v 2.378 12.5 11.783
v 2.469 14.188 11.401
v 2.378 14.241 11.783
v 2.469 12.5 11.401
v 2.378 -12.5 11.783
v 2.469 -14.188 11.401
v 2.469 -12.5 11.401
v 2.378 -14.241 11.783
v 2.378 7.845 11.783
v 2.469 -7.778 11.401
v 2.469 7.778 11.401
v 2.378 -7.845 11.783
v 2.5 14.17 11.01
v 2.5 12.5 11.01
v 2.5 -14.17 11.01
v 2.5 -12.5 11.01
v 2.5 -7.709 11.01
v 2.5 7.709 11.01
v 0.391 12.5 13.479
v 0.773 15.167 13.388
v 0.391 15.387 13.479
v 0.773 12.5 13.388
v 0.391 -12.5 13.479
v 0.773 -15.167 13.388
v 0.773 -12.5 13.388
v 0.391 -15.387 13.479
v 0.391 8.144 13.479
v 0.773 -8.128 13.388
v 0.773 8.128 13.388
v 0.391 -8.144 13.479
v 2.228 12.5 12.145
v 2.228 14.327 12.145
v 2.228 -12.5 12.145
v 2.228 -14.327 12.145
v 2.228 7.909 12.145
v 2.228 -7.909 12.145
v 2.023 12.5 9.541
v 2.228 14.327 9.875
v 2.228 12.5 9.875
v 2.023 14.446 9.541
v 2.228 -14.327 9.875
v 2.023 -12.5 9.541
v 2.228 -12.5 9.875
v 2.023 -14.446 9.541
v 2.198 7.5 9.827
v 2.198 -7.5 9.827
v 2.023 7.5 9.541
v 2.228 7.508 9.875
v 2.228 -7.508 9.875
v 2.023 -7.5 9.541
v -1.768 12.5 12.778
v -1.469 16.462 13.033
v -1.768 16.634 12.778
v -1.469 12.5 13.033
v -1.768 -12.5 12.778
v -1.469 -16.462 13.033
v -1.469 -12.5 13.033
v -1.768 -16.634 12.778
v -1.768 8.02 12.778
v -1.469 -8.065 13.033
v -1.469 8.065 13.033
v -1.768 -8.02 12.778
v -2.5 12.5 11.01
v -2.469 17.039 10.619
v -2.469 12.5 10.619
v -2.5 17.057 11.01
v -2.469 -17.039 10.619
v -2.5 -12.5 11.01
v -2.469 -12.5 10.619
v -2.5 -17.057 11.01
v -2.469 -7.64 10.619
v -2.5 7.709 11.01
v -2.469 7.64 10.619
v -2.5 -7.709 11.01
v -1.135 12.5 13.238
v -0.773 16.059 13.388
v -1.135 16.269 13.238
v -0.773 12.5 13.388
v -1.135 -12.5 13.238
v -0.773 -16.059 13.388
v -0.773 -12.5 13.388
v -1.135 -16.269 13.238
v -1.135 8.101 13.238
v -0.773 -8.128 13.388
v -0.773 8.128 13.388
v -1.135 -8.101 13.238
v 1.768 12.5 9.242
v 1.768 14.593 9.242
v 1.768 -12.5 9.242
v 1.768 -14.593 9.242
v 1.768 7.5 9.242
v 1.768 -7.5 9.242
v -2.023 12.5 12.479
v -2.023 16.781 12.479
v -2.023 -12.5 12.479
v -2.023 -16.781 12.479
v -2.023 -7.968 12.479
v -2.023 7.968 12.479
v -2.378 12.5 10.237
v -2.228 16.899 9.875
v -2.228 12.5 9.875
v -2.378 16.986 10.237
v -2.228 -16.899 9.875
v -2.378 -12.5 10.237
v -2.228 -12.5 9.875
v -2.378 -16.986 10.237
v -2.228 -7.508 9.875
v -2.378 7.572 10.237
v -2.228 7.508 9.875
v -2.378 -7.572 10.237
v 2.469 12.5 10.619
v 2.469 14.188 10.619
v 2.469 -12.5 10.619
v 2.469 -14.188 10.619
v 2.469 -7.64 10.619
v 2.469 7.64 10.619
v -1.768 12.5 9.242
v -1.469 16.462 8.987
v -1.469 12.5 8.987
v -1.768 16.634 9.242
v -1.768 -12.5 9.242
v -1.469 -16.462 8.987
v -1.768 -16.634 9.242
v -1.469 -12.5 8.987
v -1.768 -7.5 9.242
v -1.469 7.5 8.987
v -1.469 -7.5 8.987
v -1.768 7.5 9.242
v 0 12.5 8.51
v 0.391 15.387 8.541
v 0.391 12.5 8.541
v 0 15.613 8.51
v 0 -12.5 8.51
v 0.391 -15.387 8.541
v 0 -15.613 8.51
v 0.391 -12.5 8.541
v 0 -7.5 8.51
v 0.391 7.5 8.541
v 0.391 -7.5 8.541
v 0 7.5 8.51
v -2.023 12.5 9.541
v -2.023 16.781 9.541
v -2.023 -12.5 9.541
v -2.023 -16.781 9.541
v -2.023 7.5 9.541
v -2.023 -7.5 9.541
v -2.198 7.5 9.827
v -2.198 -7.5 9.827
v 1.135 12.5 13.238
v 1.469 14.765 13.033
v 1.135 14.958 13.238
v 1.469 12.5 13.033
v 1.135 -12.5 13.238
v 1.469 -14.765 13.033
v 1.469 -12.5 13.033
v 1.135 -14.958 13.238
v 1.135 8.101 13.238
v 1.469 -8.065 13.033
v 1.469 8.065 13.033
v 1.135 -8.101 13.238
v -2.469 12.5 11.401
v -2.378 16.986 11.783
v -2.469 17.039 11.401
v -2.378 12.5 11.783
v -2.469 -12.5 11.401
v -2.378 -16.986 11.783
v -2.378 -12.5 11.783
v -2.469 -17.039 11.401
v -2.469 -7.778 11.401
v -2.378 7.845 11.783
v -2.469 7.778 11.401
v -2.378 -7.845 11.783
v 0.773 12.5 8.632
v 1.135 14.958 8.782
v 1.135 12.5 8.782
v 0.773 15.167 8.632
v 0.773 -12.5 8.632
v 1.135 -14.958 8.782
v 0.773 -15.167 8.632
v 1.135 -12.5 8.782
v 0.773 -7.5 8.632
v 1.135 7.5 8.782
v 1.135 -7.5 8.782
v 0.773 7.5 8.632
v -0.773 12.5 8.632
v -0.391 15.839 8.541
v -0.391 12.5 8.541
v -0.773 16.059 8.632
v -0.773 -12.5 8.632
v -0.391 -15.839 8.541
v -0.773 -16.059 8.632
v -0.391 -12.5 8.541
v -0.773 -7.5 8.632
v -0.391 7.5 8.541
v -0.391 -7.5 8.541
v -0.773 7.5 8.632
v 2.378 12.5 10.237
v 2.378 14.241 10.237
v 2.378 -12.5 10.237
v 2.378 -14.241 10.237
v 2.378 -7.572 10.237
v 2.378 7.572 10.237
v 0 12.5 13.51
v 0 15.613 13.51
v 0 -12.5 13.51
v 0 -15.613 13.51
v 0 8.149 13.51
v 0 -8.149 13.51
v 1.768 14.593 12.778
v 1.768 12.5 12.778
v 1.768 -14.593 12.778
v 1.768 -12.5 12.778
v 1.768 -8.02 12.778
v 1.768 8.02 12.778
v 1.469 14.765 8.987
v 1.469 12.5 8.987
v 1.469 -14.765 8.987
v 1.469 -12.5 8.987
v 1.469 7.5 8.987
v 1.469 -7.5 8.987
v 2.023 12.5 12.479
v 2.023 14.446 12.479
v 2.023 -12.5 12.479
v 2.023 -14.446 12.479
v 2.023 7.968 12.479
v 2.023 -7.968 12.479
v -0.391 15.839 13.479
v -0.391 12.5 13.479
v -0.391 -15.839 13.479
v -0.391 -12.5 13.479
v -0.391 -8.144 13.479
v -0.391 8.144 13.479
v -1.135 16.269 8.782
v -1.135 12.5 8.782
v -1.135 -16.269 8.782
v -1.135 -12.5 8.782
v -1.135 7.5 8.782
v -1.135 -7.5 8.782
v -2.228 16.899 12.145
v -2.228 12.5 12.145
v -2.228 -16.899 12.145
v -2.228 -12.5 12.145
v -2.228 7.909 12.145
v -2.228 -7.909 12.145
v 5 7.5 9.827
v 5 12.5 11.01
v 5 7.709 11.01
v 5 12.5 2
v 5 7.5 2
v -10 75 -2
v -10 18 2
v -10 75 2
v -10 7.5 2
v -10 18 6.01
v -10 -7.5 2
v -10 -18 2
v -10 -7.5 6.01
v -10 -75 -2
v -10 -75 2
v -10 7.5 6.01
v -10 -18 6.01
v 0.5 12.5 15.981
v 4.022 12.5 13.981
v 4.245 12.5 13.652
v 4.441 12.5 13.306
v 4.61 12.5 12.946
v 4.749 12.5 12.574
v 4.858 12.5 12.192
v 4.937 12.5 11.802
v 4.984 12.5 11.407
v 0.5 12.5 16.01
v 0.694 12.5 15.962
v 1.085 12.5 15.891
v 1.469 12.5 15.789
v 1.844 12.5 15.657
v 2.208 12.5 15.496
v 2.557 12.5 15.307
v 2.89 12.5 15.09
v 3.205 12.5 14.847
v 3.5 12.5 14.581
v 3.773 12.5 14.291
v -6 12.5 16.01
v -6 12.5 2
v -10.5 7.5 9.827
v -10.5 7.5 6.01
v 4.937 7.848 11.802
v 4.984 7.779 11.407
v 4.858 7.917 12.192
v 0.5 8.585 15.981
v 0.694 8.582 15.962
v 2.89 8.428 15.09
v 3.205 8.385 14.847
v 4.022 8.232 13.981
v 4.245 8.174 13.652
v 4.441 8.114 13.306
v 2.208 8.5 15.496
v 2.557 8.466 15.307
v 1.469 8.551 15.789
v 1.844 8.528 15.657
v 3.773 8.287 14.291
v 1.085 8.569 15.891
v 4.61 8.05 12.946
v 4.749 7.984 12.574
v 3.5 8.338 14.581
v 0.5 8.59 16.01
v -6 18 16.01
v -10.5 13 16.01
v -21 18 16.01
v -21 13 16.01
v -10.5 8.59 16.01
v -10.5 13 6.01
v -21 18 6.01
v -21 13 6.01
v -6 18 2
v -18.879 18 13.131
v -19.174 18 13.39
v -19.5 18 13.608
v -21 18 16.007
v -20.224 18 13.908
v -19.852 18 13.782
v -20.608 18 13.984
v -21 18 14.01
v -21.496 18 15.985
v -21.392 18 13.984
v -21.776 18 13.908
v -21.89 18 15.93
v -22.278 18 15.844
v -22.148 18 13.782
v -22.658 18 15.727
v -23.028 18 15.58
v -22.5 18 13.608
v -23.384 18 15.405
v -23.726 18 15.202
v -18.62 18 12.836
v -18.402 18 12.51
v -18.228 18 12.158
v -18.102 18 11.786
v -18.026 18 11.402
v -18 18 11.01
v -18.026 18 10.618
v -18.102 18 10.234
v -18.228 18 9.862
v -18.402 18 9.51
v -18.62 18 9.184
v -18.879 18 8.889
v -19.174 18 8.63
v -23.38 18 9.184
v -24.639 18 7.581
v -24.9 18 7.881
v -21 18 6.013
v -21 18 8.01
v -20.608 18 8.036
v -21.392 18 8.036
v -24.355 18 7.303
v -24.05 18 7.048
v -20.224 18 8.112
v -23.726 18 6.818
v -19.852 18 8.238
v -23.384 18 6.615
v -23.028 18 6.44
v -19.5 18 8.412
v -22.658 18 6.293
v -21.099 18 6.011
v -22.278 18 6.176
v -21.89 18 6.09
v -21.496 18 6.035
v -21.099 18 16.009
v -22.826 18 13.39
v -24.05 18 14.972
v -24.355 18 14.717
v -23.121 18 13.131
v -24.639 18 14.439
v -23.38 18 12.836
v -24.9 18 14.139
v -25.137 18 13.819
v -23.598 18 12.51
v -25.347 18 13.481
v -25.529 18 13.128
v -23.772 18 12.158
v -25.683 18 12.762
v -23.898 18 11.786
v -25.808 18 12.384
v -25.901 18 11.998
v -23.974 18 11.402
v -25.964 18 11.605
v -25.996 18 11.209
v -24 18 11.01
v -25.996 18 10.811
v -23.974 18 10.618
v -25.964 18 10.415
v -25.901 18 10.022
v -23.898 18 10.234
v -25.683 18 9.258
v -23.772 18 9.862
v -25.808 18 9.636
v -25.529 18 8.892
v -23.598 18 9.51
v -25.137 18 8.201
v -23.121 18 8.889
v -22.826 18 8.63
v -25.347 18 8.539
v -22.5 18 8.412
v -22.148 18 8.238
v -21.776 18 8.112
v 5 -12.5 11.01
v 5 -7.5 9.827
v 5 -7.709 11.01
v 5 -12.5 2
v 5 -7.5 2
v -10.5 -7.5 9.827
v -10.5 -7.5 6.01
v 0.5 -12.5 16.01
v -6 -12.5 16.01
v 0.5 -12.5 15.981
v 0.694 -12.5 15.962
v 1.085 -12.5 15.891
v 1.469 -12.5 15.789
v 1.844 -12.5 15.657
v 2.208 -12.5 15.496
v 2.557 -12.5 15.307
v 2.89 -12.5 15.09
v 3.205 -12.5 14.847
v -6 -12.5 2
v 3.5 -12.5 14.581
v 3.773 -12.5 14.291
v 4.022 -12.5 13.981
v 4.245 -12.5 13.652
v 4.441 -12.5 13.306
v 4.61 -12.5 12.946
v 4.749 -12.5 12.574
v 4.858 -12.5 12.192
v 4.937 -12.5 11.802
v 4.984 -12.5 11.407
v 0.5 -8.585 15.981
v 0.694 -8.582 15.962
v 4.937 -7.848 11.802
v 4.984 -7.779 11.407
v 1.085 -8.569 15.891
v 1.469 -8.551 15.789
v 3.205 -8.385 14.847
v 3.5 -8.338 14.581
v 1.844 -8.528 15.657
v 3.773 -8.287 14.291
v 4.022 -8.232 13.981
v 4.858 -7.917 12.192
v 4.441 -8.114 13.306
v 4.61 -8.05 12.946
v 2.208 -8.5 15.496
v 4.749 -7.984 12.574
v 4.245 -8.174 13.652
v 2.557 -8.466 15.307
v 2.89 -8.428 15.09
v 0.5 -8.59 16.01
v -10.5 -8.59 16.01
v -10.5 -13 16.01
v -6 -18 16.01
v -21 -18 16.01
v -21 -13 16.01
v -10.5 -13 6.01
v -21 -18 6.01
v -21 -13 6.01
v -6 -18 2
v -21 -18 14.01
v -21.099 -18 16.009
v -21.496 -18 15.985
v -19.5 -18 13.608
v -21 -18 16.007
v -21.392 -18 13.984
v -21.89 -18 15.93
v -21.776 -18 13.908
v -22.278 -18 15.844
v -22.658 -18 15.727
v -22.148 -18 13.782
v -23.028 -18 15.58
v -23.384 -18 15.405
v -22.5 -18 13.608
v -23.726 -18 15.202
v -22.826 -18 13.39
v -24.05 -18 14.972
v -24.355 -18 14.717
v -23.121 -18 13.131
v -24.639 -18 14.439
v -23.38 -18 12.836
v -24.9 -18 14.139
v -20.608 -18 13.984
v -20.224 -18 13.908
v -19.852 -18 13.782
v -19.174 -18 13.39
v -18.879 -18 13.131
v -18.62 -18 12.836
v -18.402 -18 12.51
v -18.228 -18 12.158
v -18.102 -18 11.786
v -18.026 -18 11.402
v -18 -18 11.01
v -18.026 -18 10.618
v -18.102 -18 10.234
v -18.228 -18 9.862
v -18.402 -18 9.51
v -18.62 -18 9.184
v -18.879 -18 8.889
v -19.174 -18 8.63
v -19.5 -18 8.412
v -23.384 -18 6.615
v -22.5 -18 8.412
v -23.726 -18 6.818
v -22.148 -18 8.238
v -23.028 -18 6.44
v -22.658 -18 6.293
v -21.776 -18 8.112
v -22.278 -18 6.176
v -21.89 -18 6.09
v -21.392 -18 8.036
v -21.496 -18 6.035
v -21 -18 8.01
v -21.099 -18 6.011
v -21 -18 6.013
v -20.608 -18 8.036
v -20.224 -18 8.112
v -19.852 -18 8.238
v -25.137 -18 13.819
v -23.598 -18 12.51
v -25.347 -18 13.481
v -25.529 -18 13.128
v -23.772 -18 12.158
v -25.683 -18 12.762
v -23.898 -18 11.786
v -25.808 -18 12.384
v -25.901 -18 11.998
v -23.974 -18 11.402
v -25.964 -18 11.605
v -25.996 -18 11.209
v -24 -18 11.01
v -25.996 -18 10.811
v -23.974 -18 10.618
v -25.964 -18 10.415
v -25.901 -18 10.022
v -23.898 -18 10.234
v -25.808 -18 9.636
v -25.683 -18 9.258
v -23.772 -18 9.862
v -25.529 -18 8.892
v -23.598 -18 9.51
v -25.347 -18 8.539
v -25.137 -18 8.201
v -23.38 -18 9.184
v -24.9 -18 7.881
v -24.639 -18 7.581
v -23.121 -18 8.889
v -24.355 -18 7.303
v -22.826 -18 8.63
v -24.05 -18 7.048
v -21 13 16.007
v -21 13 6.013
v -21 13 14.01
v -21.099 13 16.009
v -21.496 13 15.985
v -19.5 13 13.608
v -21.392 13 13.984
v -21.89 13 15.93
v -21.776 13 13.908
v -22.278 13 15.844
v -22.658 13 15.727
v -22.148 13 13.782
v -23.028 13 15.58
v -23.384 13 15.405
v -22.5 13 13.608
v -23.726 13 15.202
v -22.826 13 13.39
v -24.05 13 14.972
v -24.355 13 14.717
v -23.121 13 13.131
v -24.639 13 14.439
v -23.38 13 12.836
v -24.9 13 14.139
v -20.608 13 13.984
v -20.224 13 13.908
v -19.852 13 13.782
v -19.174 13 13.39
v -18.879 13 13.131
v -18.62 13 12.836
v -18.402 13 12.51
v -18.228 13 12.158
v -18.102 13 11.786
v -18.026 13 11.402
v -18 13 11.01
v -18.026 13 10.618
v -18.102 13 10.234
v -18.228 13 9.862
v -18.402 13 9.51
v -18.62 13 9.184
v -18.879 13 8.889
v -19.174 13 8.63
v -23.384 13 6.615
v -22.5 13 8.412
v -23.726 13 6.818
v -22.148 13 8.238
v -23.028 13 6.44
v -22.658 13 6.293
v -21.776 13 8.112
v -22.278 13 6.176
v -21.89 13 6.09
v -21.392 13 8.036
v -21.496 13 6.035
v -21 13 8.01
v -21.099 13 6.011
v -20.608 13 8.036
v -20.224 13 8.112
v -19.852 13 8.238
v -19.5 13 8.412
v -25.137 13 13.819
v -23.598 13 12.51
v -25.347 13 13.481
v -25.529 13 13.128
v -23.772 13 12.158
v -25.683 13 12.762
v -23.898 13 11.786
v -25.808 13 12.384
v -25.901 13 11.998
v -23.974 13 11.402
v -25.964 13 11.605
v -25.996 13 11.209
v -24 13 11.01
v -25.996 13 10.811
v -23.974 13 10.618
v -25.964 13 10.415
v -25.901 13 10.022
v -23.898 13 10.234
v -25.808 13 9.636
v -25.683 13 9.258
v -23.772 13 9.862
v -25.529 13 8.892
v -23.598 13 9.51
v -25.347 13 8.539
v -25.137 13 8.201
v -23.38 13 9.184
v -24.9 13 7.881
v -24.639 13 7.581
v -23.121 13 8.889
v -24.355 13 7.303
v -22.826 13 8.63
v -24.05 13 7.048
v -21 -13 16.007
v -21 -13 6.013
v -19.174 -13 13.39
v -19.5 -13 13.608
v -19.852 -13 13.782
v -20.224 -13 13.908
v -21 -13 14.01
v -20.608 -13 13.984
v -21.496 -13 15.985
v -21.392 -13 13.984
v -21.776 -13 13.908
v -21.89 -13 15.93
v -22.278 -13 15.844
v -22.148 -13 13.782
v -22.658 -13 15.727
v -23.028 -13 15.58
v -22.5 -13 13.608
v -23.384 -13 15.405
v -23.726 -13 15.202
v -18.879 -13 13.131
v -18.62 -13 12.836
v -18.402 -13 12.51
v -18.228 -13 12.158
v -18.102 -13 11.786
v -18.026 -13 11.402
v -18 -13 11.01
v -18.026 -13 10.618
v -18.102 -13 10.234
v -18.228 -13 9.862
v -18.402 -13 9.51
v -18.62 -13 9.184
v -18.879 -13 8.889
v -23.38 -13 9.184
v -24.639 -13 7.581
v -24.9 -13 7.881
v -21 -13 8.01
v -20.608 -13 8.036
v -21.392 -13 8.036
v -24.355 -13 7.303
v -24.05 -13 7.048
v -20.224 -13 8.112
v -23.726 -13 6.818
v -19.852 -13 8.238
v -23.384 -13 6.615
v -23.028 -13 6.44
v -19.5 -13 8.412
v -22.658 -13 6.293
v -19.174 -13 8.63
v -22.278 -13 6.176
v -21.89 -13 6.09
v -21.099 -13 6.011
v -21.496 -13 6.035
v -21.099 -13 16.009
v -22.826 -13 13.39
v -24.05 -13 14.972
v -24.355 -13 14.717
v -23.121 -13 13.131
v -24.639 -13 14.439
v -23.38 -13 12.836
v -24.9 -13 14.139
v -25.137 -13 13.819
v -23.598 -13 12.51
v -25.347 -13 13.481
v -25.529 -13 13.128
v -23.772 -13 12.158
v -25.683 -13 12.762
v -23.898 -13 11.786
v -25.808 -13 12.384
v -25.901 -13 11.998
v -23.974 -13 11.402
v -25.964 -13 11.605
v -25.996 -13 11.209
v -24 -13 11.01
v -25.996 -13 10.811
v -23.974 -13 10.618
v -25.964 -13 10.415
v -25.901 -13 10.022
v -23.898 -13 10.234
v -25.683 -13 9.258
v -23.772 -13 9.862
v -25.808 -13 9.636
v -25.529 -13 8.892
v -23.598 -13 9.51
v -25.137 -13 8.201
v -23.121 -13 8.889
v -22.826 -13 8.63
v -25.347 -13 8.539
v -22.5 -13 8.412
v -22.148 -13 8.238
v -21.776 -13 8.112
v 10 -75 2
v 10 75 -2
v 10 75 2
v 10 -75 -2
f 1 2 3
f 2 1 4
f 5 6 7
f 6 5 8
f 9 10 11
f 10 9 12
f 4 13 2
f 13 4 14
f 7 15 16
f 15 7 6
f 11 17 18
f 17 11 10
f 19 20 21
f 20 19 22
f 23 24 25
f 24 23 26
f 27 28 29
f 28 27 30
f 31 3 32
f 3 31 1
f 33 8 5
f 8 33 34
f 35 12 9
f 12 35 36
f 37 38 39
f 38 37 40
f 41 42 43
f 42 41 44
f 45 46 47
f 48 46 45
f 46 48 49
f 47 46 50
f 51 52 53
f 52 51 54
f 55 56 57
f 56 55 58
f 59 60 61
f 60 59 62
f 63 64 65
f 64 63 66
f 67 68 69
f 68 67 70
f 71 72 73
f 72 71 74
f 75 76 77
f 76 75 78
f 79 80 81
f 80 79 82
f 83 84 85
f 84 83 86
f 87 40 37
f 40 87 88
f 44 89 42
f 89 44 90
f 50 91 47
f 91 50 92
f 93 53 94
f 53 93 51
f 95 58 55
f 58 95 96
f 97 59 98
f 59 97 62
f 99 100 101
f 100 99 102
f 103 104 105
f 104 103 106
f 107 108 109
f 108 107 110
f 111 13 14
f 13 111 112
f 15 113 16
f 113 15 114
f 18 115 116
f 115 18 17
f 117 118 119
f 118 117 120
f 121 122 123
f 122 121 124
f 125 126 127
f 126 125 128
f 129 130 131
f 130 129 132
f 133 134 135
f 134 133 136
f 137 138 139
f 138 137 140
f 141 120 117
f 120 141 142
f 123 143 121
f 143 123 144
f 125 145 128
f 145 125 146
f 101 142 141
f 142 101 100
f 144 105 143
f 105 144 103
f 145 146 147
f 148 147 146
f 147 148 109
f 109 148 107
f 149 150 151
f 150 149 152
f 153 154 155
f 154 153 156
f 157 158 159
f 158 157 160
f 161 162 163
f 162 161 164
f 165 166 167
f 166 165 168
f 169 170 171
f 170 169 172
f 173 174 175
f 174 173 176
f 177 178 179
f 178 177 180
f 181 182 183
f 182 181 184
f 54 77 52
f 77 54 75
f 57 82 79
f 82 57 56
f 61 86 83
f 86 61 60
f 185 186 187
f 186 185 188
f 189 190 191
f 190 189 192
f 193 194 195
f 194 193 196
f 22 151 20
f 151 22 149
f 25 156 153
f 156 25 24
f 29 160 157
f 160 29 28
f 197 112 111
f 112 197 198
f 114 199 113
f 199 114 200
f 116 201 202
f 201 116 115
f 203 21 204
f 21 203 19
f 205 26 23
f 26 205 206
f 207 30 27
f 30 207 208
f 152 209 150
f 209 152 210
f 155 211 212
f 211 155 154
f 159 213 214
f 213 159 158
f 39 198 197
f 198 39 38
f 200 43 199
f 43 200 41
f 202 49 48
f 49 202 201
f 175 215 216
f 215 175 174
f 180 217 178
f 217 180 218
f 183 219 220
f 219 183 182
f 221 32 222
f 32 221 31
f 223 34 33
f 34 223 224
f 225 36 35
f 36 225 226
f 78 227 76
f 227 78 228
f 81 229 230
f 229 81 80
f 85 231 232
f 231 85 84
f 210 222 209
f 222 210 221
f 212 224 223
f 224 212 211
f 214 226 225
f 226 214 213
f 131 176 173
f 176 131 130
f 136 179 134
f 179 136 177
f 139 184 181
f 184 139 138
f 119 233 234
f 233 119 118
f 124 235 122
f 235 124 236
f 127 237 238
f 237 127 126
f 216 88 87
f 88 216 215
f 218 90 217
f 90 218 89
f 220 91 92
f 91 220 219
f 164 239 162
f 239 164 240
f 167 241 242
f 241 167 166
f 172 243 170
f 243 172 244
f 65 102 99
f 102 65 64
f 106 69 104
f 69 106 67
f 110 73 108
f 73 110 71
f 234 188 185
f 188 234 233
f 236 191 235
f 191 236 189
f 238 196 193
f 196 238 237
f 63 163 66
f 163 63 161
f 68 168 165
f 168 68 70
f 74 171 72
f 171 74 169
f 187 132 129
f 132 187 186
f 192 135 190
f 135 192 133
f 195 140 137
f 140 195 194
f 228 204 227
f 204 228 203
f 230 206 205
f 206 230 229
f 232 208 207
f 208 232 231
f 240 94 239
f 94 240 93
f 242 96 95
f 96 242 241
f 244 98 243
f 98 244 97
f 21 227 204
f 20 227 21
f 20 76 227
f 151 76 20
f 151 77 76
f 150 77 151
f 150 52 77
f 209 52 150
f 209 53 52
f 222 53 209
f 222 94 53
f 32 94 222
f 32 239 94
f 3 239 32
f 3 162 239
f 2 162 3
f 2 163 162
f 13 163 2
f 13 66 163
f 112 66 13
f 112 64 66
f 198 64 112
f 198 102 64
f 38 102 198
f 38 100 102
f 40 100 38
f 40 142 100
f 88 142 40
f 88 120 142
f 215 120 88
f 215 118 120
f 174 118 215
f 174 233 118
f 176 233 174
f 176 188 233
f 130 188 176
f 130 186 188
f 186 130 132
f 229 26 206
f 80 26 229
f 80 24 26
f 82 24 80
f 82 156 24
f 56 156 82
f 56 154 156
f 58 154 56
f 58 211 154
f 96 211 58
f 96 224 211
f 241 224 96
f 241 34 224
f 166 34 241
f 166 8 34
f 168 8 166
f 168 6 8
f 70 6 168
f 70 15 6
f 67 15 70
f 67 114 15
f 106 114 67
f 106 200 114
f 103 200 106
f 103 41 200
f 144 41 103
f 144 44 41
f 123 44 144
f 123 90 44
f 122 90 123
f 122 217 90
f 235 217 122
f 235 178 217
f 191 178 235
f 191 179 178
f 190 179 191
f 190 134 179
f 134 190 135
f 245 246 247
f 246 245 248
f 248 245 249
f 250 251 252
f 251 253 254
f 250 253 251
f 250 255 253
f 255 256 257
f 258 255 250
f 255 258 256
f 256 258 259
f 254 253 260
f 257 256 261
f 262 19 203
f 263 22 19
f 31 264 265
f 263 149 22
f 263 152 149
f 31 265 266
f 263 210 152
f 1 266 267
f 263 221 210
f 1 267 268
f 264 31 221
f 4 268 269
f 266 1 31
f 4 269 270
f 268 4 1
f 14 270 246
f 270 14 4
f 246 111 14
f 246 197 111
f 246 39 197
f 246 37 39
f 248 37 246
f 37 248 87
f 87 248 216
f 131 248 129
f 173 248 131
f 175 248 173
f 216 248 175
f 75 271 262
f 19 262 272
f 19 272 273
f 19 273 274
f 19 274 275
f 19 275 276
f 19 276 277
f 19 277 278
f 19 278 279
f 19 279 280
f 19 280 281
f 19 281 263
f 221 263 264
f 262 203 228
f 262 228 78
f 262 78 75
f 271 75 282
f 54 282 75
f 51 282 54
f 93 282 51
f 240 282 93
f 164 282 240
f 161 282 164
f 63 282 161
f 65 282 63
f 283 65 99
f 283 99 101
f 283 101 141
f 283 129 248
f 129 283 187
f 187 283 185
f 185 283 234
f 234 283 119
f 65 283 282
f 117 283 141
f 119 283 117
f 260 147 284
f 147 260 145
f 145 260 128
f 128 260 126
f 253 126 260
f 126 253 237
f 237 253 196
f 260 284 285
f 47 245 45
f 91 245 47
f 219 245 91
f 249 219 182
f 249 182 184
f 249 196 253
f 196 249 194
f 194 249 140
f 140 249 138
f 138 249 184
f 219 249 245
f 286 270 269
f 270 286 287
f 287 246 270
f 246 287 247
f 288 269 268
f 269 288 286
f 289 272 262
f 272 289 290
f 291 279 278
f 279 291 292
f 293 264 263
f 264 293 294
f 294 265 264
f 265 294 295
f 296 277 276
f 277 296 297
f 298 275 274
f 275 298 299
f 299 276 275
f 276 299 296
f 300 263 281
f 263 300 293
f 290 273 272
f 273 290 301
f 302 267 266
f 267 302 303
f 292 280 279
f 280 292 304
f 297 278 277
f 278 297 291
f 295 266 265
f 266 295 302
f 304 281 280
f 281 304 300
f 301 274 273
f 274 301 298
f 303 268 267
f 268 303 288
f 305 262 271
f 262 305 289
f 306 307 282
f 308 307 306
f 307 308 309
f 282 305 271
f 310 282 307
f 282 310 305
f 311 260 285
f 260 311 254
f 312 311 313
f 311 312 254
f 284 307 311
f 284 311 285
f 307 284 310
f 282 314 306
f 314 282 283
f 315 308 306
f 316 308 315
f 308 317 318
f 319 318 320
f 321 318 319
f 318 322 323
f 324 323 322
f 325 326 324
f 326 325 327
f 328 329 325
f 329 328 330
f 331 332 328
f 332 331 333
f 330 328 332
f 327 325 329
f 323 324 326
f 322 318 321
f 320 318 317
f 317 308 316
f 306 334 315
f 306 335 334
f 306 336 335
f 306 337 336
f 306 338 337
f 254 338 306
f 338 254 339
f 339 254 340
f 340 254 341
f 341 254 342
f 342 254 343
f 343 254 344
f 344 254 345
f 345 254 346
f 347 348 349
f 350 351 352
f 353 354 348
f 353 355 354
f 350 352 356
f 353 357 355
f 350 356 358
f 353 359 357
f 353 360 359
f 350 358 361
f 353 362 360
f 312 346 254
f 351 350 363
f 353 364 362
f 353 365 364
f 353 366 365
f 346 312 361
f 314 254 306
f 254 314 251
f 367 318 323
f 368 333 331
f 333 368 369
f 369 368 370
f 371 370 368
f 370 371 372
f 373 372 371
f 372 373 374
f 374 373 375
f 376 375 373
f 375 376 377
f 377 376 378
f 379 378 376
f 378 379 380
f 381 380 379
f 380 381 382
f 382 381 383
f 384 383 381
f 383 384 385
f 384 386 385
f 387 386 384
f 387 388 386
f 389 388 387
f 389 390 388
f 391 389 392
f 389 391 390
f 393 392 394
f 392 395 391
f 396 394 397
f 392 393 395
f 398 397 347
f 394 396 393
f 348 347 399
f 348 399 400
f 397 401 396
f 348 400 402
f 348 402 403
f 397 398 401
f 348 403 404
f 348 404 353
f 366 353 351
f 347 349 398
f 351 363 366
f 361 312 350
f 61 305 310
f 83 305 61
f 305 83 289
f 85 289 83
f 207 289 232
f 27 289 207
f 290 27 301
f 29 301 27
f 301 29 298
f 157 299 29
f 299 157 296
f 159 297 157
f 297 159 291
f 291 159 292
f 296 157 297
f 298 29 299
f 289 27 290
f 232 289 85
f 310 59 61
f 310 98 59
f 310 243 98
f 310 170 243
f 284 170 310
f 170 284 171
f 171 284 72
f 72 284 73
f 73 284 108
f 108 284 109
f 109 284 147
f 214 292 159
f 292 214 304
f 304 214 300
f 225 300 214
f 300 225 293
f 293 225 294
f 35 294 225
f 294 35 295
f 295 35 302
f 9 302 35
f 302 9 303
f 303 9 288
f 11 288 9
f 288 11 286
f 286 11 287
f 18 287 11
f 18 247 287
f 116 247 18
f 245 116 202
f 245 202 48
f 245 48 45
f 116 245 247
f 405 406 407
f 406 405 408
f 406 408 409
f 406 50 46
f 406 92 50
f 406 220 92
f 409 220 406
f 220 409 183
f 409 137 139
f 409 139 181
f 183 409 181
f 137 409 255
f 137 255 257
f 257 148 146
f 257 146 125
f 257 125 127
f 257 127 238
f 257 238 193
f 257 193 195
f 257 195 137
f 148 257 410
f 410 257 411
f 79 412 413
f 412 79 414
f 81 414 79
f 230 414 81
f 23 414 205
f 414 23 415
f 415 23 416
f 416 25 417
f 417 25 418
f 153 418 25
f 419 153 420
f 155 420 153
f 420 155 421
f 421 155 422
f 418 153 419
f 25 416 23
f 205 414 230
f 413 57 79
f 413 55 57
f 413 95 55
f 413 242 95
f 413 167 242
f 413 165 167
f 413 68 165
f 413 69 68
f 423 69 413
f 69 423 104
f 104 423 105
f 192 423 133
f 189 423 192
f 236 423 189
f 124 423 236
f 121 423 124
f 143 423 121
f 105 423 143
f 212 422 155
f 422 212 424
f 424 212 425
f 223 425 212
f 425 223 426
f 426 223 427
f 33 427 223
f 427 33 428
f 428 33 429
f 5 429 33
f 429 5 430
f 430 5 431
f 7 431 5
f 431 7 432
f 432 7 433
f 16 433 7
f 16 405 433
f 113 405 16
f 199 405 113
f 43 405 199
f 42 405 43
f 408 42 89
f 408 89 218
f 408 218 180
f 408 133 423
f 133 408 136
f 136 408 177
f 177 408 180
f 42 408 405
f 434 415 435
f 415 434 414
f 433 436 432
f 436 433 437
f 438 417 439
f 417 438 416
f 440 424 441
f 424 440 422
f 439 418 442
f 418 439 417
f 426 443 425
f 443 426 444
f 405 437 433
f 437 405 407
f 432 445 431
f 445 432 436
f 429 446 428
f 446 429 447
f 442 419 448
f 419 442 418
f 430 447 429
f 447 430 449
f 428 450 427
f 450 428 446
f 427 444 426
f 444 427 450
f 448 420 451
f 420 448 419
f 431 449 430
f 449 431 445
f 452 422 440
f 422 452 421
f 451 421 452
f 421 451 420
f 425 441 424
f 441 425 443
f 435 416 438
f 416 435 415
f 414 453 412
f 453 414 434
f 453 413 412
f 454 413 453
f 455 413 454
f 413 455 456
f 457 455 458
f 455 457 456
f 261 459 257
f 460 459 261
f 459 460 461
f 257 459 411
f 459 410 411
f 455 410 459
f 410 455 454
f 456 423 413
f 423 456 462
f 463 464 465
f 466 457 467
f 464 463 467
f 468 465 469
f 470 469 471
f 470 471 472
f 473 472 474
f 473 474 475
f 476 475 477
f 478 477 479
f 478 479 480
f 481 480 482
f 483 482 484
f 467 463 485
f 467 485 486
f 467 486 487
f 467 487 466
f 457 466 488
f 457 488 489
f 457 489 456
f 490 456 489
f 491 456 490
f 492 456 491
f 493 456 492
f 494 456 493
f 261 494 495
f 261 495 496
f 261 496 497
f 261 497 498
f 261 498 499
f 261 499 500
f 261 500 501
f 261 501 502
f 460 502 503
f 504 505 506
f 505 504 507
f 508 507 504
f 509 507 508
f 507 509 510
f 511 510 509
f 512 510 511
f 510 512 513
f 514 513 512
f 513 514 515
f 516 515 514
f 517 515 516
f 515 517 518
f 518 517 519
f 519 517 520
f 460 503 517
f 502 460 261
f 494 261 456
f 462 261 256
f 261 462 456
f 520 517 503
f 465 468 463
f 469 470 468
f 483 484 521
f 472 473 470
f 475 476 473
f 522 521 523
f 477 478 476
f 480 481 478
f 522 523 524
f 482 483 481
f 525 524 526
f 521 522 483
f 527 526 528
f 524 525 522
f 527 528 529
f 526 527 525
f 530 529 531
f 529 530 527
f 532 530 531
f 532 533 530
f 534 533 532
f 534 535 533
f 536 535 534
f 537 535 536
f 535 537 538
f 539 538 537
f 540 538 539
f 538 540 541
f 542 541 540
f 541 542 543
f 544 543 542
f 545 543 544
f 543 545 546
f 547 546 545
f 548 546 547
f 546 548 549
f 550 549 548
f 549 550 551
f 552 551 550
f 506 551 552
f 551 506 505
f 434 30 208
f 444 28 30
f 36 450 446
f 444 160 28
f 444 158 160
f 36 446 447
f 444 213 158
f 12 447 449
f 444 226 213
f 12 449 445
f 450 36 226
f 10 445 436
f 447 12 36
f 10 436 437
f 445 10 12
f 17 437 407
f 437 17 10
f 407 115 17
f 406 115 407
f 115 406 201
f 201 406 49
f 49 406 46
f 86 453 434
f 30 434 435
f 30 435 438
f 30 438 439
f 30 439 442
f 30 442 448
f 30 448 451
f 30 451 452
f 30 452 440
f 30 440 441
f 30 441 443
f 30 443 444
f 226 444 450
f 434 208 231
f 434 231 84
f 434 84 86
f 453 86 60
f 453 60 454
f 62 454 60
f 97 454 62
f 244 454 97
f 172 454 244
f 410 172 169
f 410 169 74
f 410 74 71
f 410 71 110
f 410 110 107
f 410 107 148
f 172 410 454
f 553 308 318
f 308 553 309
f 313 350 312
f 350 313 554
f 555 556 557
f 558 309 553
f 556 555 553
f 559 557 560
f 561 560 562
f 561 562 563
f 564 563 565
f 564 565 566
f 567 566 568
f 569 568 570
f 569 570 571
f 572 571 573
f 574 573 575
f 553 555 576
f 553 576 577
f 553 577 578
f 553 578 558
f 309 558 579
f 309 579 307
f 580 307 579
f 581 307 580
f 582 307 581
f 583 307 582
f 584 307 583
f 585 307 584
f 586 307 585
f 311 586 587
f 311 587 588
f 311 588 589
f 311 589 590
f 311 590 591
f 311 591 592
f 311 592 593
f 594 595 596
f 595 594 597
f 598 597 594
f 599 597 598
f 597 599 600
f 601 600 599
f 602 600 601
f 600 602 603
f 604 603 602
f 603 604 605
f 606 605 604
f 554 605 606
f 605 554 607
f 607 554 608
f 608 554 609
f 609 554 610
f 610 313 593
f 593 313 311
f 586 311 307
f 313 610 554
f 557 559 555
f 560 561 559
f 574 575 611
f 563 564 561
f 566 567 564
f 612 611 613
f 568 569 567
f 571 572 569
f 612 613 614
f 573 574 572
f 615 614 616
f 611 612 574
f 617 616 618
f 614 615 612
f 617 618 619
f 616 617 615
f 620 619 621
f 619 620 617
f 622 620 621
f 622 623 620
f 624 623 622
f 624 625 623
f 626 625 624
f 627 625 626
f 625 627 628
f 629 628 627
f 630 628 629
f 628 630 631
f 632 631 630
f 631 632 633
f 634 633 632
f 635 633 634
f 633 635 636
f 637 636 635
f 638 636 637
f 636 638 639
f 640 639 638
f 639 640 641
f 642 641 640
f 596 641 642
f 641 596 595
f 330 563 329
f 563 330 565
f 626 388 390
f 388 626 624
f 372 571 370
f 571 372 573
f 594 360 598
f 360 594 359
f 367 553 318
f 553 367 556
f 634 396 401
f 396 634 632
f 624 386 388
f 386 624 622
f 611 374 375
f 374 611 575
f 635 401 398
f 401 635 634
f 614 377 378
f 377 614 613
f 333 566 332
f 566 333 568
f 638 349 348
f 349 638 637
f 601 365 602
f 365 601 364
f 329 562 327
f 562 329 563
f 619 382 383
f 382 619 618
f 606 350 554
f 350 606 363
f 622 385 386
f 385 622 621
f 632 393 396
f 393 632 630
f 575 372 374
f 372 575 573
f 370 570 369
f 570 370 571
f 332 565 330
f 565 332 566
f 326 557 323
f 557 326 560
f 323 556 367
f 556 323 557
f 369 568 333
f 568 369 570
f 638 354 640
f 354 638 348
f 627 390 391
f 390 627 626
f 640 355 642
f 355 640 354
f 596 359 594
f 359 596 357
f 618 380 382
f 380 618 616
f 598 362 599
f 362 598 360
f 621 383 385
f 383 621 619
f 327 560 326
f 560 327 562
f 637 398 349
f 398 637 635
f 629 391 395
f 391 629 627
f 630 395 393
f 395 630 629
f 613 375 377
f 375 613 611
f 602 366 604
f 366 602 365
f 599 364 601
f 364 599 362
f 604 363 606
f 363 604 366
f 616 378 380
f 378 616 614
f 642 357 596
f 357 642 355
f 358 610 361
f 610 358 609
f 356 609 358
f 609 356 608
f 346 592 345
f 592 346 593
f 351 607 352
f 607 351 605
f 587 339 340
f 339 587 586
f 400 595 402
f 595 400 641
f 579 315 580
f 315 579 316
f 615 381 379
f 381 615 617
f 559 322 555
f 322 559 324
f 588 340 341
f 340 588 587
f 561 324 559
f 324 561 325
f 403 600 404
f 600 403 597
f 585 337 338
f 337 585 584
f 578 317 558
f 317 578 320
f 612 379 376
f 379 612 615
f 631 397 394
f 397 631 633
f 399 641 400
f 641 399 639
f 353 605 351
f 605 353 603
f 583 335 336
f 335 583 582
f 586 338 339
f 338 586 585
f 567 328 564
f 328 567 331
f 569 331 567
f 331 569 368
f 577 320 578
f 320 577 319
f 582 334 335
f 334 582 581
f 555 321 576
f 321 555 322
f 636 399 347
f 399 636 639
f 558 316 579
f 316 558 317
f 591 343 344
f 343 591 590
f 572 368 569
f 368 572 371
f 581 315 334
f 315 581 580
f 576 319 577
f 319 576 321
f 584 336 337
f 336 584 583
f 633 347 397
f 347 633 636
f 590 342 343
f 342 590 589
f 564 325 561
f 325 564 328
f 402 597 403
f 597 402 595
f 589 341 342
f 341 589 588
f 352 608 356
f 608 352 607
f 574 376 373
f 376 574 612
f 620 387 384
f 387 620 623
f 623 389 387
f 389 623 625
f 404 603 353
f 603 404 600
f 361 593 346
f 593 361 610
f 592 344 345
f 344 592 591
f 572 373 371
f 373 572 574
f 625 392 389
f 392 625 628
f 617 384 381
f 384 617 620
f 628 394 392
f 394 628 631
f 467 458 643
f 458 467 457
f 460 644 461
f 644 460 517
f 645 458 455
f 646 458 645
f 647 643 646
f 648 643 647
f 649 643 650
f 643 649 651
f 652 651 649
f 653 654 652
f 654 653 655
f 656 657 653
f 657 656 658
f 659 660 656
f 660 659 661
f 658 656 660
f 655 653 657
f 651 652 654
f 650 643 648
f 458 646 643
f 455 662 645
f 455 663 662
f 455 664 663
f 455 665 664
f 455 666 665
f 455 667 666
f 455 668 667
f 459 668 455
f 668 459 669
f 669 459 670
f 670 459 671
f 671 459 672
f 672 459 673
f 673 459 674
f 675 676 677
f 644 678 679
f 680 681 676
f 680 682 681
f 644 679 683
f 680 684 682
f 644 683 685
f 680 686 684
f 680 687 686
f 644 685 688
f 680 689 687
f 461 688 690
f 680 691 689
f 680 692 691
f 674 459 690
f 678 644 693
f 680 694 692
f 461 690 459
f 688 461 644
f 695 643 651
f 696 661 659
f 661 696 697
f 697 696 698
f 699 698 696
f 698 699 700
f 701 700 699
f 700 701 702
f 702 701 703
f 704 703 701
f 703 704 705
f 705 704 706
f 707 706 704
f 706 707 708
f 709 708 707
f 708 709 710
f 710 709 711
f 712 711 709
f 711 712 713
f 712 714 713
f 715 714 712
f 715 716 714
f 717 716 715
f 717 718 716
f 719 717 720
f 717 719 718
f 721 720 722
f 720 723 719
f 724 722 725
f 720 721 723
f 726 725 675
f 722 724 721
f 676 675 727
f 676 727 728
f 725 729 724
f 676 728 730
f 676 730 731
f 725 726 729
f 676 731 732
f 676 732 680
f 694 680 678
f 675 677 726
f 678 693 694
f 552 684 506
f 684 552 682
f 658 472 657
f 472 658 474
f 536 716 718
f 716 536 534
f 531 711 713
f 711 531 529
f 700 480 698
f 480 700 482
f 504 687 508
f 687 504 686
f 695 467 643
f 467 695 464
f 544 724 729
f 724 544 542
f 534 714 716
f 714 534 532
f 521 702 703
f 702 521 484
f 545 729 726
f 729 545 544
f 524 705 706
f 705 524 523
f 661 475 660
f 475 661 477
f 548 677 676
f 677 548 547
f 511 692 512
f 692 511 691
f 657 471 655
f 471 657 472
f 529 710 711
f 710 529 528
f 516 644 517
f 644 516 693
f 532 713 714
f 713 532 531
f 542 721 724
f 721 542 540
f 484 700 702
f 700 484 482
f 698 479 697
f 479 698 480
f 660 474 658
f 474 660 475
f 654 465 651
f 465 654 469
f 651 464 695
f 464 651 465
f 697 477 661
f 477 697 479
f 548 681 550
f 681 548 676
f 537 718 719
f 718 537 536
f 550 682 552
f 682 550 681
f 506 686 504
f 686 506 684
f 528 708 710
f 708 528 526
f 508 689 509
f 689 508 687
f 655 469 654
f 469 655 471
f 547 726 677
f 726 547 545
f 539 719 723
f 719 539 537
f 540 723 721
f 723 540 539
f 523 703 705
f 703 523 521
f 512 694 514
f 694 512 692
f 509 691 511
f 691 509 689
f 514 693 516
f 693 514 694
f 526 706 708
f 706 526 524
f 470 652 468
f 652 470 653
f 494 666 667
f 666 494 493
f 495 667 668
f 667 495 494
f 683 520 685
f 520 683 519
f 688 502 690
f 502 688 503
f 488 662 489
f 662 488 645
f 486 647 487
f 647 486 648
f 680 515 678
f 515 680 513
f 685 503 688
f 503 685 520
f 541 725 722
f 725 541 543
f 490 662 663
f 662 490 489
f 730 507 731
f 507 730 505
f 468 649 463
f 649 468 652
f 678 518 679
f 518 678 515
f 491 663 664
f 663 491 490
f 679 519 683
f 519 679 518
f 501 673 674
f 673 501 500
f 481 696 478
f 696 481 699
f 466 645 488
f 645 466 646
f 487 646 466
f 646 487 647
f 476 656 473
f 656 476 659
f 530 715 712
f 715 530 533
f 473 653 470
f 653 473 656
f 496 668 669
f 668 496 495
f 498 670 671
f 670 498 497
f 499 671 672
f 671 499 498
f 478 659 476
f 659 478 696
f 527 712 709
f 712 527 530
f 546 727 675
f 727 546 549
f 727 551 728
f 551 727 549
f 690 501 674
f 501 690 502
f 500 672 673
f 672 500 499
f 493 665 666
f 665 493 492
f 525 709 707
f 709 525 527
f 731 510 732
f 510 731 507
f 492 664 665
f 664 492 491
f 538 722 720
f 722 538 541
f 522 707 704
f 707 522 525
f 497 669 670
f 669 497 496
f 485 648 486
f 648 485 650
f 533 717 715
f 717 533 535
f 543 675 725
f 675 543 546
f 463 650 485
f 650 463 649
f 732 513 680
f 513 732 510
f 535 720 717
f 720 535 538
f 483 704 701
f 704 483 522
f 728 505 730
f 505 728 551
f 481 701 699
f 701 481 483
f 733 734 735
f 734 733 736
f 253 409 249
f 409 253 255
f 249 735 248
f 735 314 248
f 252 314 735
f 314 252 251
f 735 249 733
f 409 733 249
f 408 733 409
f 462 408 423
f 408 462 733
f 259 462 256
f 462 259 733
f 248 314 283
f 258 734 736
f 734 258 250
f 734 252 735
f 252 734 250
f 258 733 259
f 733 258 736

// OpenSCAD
$fa = 1;
$fs = 0.4;
//Oriontation using a clock: X is 4, Y is 2 and Z is 12
//Linked Conveyer Belt
belt_width = 150; //Generaly how wide each link will be.
belt_length = 20; //Do not adjust this to set gap between links
belt_height = 4; //Thickness

//Main board
translate([-belt_length/2,-belt_width/2,-belt_height/2])
    cube([belt_length, belt_width, belt_height]);

//Link mechanism
link_width = 5;
link_length = 10;
link_height = 10;
connect_length = 37;
connect_diameter = 5;
gap_overset = 0; //Changes this to add gap between belt pieces
gap_offset = 6+gap_overset; //Dont change this

module link() {
    
    //Connection rod
    difference(){
        translate([0, 0, belt_height+(link_height/2)+0.01])
            rotate([90,0,0])
            cylinder(h=connect_length, d=connect_diameter, center=true);
        translate([0, connect_length/2, belt_height+(link_height/2)+0.01])
            rotate([0,0,60]) //set angle for right slope
            cube([connect_diameter, connect_diameter*2, connect_diameter], center=true); 
        translate([0, -connect_length/2, belt_height+(link_height/2)+0.01])
            rotate([0,0,120]) //set angle for left slope
            cube([connect_diameter, connect_diameter*2, connect_diameter], center=true);
    }

    difference(){
        union(){
        //Connection to board right
        translate([-belt_length*0.125, belt_length/2, belt_height+0.01])
            cube([belt_length*0.75,link_width,link_height], center=true);
        //right round connector
        translate([0, belt_length/2, belt_height+(link_height/2)+0.01])
            rotate([90,0,0])
            cylinder(h=link_width, d=link_length, center=true);
        //right inner extender
        translate([-connect_diameter, belt_length/2, belt_height+(link_height/2)+0.01])
            cube([link_length+1,link_width,link_height], center=true);
        //right connection between inner and outer extender
        translate([-link_length+1.75, (belt_length/2)+(link_width/2)+0.5, belt_height+(link_height/2)+0.01])
            cube([(link_length/2)-0.5,link_width*2,link_height], center=true);
        translate([-link_length+2, (belt_length/2)+(link_width/2)+0.5, belt_height])
            cube([(link_length/2)-1,link_width*2,link_height], center=true);
        
            }
        //slight angle to steer gear teeth
        translate([0,belt_length/2.8,belt_height+link_height-1])
            rotate([170,0,0])
            cube([50,link_width/2,link_height*1.5], center=true);
     } 

    difference(){
        union(){
        //Connection to board left
        translate([-belt_length*0.125, -belt_length/2, belt_height+0.01])
            cube([belt_length*0.75,link_width,link_height], center=true);
        //left round connector
        translate([0, -belt_length/2, belt_height+(link_height/2)+0.01])
            rotate([90,0,0])
            cylinder(h=link_width, d=link_length, center=true);
        //left inner extender
        translate([-connect_diameter, -belt_length/2, belt_height+(link_height/2)+0.01])
            cube([link_length+1,link_width,link_height], center=true);
        //left connection between inner and outer extender    
        translate([-link_length+1.75, -(belt_length/2)-(link_width/2)-0.5, belt_height+(link_height/2)+0.01])
            cube([(link_length/2)-0.5,link_width*2,link_height], center=true);
        translate([-link_length+2, -(belt_length/2)-(link_width/2)-0.5, belt_height])
            cube([(link_length/2)-1,link_width*2,link_height], center=true);
        }
        //slight angle to steer gear teeth
        translate([0,-belt_length/2.8, belt_height+link_height-1])
            rotate([10,0,0])
            cube([50,link_width/2,link_height*1.5], center=true);
    }

    //Right outer extender
    difference(){
            union(){
        translate([-link_length-gap_offset, (belt_length/2)+link_width+0.5, belt_height+(link_height/2)+0.01])
            cube([link_length,link_width,link_height], center=true);
        translate([-link_length-1, (belt_length/2)+link_width+0.5, belt_height+(link_height/2)+0.01])
            cube([link_length,link_width,link_height], center=true);
        translate([(-link_length*1.5)-gap_offset, (belt_length/2)+link_width+0.5, belt_height+(link_height/2)+0.01])
            rotate([90,0,0])
            cylinder(h=link_width, d=link_length, center=true);
            }
        //Hole in outer right extender 
       translate([(-link_length*1.5)-gap_offset, (belt_length/2)+link_width+0.5, belt_height+(link_height/2)+0.01])
            rotate([90,0,0])
            cylinder(h=link_width+2, d=connect_diameter+1, center=true);
    }

    //Left outer extender
    difference(){
            union(){
        translate([-link_length-gap_offset, -(belt_length/2)-link_width-0.5, belt_height+(link_height/2)+0.01])
            cube([link_length,link_width,link_height], center=true);
        translate([-link_length-1, -(belt_length/2)-link_width-0.5, belt_height+(link_height/2)+0.01])
            cube([link_length,link_width,link_height], center=true);
        translate([(-link_length*1.5)-gap_offset, -(belt_length/2)-link_width-0.5, belt_height+(link_height/2)+0.01])
            rotate([90,0,0])
            cylinder(h=link_width, d=link_length, center=true);
            }
        //Hole in outer left extender
       translate([(-link_length*1.5)-gap_offset, -(belt_length/2)-link_width-1, belt_height+(link_height/2)+0.01])
            rotate([90,0,0])
            cylinder(h=link_width+2, d=connect_diameter+1, center=true);
    }     
}
translate([0,0,belt_height/2])
link();
